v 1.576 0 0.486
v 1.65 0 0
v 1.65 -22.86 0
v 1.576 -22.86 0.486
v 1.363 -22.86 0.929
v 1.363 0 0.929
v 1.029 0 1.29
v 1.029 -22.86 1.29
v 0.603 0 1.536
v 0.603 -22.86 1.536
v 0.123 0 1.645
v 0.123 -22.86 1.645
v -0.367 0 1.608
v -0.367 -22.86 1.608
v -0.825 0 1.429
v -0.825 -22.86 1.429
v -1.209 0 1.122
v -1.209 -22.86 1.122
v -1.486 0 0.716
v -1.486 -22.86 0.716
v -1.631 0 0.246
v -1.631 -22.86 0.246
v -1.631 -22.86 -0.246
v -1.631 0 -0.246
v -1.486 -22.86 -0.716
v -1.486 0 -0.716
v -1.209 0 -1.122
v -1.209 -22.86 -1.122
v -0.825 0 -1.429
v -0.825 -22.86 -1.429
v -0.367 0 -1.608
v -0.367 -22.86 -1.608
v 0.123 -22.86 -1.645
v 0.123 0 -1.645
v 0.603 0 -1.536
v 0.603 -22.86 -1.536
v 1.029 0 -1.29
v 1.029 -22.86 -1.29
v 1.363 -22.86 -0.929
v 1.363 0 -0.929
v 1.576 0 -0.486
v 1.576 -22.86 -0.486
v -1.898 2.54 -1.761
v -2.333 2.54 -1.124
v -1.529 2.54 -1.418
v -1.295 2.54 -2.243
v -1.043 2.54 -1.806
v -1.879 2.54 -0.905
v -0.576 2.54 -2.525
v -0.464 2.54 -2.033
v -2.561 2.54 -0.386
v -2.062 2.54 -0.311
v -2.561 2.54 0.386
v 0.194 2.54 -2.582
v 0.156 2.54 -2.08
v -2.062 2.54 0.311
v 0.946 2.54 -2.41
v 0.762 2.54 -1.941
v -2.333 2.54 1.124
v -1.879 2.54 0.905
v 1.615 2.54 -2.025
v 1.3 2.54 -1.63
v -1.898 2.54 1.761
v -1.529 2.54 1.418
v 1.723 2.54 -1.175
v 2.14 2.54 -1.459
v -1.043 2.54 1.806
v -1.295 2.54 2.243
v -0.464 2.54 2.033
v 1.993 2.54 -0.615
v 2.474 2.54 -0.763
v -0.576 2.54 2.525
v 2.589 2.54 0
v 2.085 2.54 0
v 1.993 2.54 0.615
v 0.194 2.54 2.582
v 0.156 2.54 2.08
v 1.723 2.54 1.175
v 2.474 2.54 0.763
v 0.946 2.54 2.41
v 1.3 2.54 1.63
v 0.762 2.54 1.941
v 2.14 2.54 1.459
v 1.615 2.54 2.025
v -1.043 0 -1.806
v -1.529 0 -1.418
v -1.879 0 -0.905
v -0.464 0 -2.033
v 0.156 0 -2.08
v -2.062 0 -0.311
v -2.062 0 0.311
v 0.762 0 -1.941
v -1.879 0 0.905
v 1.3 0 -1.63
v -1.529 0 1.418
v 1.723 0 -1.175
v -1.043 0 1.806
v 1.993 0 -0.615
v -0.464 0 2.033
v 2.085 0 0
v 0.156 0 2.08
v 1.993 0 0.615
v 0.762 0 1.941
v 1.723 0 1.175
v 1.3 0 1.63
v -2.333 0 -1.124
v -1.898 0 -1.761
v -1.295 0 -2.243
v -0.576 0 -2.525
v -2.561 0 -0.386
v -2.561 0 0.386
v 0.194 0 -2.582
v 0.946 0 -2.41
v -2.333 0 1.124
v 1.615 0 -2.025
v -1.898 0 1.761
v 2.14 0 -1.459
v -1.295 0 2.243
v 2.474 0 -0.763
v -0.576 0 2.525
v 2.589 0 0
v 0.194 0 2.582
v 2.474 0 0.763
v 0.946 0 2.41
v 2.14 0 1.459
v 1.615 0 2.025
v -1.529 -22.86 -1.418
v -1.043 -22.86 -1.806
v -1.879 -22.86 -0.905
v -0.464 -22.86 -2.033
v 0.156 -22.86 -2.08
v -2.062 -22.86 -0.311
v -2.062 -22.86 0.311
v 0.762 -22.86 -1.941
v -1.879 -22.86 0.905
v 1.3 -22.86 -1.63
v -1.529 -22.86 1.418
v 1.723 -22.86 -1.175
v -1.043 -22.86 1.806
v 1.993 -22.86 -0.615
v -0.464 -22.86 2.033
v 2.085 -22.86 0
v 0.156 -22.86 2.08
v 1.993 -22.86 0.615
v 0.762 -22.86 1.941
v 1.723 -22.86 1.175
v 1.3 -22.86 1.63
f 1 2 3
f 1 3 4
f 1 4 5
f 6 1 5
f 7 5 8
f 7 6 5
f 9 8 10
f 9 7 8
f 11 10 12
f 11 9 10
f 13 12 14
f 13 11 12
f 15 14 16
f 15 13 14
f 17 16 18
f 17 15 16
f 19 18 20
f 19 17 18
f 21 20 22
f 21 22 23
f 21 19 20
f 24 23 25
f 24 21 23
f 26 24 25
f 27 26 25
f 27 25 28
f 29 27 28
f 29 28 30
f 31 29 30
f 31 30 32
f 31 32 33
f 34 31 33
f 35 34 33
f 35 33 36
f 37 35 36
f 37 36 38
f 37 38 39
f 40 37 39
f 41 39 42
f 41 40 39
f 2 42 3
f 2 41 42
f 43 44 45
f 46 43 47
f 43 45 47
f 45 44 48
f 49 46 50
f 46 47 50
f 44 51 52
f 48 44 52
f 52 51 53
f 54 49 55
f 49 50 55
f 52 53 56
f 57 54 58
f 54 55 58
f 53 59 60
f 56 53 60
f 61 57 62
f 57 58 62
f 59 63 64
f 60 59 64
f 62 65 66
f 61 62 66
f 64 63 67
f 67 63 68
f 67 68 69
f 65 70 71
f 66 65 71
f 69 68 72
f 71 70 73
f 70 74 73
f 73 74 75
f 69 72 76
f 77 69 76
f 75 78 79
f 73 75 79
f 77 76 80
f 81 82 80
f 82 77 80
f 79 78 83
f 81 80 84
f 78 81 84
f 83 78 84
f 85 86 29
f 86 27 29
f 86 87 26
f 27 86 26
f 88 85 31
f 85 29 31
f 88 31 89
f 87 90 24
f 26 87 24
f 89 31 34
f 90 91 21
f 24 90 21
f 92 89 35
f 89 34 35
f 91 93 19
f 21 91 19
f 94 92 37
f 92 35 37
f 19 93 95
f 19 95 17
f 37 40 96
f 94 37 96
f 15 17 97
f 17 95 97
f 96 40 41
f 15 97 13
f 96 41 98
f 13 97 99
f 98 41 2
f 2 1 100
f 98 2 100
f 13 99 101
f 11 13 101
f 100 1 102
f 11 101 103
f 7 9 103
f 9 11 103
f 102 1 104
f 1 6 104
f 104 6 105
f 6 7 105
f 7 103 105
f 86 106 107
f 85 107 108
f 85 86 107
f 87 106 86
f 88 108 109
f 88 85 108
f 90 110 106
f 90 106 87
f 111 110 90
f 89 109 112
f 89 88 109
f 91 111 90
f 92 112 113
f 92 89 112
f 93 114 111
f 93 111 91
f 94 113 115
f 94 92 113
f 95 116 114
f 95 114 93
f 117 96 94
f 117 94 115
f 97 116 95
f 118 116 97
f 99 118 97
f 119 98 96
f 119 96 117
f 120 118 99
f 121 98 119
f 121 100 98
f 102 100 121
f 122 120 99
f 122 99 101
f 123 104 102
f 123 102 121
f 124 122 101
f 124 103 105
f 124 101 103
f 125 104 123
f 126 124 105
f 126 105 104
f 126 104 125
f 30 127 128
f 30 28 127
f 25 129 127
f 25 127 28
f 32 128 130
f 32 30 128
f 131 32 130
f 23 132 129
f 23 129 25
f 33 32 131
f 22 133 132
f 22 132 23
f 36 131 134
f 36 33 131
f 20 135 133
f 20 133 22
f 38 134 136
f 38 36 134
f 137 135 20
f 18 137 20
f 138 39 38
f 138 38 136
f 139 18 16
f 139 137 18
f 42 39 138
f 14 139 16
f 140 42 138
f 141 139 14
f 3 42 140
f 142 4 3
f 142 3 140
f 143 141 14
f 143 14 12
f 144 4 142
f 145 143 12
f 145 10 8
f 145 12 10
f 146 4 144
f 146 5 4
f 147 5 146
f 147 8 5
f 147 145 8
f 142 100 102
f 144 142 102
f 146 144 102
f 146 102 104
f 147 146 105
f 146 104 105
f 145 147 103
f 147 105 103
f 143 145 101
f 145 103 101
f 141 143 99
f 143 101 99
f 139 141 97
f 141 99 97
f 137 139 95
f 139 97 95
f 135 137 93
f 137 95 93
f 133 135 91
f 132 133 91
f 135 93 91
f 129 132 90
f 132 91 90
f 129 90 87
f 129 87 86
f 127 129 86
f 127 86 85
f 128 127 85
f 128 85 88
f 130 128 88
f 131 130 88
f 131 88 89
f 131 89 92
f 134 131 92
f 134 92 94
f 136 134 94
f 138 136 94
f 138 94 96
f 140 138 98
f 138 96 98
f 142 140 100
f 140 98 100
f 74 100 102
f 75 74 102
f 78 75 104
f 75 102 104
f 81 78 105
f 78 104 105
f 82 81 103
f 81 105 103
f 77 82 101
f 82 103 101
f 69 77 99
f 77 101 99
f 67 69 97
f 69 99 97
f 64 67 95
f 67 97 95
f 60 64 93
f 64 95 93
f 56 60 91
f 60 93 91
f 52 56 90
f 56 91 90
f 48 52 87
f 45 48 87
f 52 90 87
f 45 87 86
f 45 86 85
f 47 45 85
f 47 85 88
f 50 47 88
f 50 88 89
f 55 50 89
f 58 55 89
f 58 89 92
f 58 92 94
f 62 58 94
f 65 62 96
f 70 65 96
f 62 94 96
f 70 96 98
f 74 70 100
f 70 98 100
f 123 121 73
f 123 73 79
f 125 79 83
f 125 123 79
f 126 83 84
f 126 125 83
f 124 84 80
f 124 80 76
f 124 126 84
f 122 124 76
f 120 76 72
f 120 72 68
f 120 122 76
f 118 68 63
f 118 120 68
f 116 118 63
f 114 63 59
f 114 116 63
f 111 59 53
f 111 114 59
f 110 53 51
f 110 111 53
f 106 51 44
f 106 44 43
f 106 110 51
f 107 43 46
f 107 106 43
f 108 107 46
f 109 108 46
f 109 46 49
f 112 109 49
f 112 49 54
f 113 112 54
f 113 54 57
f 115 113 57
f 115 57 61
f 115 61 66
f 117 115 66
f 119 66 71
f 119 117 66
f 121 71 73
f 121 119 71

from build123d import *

# Parameters (mm, degrees)
F0_R     = 2.085416
F0_R_2   = 1.649774
F1_DEPTH = 22.86
F0_R_3   = 2.589467
F3_DEPTH = 2.54


with BuildPart() as f1:
    # F0 (on Front) → F1 (new body)
    with BuildSketch(Plane.XZ):
        Circle(F0_R)
        Circle(F0_R_2, mode=Mode.SUBTRACT)
    extrude(amount=F1_DEPTH)


with BuildPart() as f3:
    # F0 (on Front) → F3 (new body)
    with BuildSketch(Plane.XZ):
        Circle(F0_R_3)
        Circle(F0_R, mode=Mode.SUBTRACT)
    extrude(amount=-F3_DEPTH)


solid = Compound([f1.part, f3.part])
